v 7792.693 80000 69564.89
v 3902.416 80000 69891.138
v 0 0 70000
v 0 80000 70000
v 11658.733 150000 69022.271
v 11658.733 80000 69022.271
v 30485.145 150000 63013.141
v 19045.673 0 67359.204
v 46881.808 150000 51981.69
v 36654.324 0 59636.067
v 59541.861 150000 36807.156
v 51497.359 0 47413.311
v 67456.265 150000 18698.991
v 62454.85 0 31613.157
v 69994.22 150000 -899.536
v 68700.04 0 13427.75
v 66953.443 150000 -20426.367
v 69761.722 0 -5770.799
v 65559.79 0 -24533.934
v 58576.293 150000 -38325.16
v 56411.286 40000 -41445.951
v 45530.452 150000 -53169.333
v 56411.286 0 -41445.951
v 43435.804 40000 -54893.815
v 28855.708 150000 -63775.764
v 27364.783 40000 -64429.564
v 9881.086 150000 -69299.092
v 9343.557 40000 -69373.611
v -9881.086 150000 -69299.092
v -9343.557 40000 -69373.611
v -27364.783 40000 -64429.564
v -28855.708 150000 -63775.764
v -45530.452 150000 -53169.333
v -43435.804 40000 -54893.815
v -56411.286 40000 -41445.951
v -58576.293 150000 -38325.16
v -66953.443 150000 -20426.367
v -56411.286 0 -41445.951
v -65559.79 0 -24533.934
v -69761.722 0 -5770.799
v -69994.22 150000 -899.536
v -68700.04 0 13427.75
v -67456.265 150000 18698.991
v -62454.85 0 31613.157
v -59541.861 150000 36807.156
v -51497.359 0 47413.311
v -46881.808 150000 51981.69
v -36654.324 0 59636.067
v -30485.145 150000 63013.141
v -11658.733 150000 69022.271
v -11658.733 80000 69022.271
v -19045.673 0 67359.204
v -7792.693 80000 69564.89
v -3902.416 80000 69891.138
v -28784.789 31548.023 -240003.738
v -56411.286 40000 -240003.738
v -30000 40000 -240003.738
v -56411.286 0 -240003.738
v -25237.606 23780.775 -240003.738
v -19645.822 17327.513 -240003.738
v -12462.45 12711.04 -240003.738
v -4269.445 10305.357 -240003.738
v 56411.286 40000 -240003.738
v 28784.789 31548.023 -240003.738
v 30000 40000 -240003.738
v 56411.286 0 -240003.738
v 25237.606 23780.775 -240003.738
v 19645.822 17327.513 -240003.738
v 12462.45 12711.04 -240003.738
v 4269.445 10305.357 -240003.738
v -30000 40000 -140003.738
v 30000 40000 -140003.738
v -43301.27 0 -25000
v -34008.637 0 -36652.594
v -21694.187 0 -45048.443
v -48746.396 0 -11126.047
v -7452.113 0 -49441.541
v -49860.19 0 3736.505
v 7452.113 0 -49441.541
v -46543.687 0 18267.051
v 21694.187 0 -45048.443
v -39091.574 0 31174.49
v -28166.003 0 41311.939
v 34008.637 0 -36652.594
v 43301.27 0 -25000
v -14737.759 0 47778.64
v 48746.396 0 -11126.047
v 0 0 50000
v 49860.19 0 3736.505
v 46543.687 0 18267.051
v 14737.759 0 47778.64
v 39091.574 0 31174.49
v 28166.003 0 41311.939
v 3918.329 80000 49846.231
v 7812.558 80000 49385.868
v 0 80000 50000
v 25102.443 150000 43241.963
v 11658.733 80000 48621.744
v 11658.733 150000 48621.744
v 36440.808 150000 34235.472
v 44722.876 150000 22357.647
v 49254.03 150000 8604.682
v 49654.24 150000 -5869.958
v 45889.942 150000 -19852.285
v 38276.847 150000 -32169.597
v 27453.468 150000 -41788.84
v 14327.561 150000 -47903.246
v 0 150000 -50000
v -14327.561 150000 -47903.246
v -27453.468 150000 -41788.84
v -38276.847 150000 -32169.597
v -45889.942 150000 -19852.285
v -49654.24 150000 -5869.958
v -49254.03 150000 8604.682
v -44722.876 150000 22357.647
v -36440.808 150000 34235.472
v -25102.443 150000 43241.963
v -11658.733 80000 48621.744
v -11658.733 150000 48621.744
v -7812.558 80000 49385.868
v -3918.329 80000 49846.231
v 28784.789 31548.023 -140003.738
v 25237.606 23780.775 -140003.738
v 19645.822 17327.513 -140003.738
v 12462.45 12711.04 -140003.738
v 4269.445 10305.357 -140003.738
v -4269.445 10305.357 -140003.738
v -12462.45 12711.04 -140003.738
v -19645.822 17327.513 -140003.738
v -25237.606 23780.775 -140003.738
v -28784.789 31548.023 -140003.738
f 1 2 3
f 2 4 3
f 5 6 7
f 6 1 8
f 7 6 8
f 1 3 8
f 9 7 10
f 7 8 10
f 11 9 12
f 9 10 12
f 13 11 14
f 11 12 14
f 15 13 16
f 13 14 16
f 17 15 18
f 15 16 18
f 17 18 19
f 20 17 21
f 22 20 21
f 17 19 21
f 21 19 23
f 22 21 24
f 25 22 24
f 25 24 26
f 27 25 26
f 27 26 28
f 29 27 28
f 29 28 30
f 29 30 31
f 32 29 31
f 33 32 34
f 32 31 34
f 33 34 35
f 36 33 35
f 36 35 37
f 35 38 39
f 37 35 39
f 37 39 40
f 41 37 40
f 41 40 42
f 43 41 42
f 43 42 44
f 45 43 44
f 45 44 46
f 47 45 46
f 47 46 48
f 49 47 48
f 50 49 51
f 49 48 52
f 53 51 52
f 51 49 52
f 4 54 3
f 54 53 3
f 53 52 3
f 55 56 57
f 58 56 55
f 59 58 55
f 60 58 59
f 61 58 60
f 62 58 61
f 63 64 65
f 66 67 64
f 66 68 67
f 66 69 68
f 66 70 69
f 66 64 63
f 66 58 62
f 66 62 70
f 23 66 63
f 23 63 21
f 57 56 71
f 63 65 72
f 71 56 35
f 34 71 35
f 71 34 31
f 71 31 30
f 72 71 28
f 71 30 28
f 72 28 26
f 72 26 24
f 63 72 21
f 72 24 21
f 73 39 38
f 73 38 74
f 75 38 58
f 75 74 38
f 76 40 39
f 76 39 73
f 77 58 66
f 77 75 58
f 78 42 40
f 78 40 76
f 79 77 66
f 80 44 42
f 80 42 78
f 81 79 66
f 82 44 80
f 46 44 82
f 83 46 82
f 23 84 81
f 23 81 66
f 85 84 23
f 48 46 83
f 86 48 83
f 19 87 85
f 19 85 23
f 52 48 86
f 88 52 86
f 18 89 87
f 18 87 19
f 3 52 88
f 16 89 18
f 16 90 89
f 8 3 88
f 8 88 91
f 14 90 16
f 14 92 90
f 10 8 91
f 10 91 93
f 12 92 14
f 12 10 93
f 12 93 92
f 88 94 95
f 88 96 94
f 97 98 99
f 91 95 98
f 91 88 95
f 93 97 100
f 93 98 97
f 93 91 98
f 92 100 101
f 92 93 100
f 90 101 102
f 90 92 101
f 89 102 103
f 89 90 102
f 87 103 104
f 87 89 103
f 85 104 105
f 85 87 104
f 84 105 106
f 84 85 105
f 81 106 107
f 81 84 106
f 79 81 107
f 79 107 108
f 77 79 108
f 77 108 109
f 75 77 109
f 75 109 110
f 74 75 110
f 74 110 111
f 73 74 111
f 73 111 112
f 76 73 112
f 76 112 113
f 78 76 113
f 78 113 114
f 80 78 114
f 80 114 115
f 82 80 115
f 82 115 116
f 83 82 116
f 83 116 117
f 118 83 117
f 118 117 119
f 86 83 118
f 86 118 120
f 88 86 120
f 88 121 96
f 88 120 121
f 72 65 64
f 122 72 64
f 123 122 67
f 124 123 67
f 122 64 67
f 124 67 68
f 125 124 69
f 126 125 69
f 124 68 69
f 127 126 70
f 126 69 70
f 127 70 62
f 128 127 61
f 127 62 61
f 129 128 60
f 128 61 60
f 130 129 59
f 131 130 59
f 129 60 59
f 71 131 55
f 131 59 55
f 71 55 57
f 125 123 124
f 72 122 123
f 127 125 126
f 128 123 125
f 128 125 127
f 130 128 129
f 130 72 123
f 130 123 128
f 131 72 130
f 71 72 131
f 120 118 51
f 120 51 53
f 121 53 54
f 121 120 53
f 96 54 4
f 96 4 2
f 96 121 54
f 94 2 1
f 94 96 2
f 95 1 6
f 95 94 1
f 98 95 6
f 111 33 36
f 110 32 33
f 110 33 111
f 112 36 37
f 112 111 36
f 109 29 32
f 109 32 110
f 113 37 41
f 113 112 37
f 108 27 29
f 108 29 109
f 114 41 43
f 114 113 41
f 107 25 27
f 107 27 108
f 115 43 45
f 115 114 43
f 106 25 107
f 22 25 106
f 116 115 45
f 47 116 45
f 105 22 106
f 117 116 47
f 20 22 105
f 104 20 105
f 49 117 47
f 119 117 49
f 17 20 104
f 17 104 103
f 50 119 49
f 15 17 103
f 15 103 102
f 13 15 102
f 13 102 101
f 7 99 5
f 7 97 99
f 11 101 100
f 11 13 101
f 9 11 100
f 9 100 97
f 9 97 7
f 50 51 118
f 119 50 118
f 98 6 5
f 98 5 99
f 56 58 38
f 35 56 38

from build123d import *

# Parameters (mm, degrees)
SKETCH3_R               = 70000
SKETCH3_R_2             = 50000
BOSS_EXTRUDE1_DEPTH     = 150000
SKETCH7_W               = 112822.571730932
SKETCH7_H               = 198557.786962263
BOSS_EXTRUDE3_DEPTH     = 40000
SKETCH8_R               = 30000
CUT_EXTRUDE1_DEPTH      = 100000
CUT_EXTRUDE2_DEPTH      = 26529
CUT_EXTRUDE2_DEPTH_BACK = 86482
SKETCH9_R               = 50000
CUT_EXTRUDE4_DEPTH      = 43724
CUT_EXTRUDE4_DEPTH_BACK = 70000
SKETCH11_W              = 23317.46593379
SKETCH11_H              = 104003.866310114


with BuildPart() as part:
    # Sketch3 → Boss-Extrude1 (new body)
    with BuildSketch(Plane(origin=(0, 0, 0), x_dir=(1, 0, 0), z_dir=(0, 1, 0))):
        with Locations(Location((0, 0, 0), (0, 0, 270))):
            Circle(SKETCH3_R)
        with Locations(Location((0, 0, 0), (0, 0, 270))):
            Circle(SKETCH3_R_2, mode=Mode.SUBTRACT)
    extrude(amount=BOSS_EXTRUDE1_DEPTH)

    # Sketch7 → Boss-Extrude3 (add)
    with BuildSketch(Plane.XZ):
        with Locations((0, -140724.844151912)):
            Rectangle(SKETCH7_W, SKETCH7_H)
    extrude(amount=-BOSS_EXTRUDE3_DEPTH)

    # Sketch8 → Cut-Extrude1 (cut)
    with BuildSketch(Plane(origin=(0, 0, -240003.737633043), x_dir=(-1, 0, 0), z_dir=(0, 0, -1))):
        with Locations((0, 40000)):
            Circle(SKETCH8_R)
    extrude(amount=-CUT_EXTRUDE1_DEPTH, mode=Mode.SUBTRACT)

    # Sketch9 → Cut-Extrude2 (cut, two sides: drawn at the far end of the back side and taken through both)
    with BuildSketch(Plane(origin=(0, 40000, 0), x_dir=(1, 0, 0), z_dir=(0, 1, 0)).offset(-CUT_EXTRUDE2_DEPTH_BACK)):
        with Locations(Location((0, 0, 0), (0, 0, 270))):
            Circle(SKETCH9_R)
    extrude(amount=CUT_EXTRUDE2_DEPTH + CUT_EXTRUDE2_DEPTH_BACK, mode=Mode.SUBTRACT)

    # Sketch11 → Cut-Extrude4 (cut, two sides: drawn at the far end of the back side and taken through both)
    with BuildSketch(Plane(origin=(0, 150000, 0), x_dir=(1, 0, 0), z_dir=(0, 1, 0)).offset(-CUT_EXTRUDE4_DEPTH_BACK)):
        with Locations((0, -32001.933155057)):
            Rectangle(SKETCH11_W, SKETCH11_H)
    extrude(amount=CUT_EXTRUDE4_DEPTH + CUT_EXTRUDE4_DEPTH_BACK, mode=Mode.SUBTRACT)


solid = part.part
